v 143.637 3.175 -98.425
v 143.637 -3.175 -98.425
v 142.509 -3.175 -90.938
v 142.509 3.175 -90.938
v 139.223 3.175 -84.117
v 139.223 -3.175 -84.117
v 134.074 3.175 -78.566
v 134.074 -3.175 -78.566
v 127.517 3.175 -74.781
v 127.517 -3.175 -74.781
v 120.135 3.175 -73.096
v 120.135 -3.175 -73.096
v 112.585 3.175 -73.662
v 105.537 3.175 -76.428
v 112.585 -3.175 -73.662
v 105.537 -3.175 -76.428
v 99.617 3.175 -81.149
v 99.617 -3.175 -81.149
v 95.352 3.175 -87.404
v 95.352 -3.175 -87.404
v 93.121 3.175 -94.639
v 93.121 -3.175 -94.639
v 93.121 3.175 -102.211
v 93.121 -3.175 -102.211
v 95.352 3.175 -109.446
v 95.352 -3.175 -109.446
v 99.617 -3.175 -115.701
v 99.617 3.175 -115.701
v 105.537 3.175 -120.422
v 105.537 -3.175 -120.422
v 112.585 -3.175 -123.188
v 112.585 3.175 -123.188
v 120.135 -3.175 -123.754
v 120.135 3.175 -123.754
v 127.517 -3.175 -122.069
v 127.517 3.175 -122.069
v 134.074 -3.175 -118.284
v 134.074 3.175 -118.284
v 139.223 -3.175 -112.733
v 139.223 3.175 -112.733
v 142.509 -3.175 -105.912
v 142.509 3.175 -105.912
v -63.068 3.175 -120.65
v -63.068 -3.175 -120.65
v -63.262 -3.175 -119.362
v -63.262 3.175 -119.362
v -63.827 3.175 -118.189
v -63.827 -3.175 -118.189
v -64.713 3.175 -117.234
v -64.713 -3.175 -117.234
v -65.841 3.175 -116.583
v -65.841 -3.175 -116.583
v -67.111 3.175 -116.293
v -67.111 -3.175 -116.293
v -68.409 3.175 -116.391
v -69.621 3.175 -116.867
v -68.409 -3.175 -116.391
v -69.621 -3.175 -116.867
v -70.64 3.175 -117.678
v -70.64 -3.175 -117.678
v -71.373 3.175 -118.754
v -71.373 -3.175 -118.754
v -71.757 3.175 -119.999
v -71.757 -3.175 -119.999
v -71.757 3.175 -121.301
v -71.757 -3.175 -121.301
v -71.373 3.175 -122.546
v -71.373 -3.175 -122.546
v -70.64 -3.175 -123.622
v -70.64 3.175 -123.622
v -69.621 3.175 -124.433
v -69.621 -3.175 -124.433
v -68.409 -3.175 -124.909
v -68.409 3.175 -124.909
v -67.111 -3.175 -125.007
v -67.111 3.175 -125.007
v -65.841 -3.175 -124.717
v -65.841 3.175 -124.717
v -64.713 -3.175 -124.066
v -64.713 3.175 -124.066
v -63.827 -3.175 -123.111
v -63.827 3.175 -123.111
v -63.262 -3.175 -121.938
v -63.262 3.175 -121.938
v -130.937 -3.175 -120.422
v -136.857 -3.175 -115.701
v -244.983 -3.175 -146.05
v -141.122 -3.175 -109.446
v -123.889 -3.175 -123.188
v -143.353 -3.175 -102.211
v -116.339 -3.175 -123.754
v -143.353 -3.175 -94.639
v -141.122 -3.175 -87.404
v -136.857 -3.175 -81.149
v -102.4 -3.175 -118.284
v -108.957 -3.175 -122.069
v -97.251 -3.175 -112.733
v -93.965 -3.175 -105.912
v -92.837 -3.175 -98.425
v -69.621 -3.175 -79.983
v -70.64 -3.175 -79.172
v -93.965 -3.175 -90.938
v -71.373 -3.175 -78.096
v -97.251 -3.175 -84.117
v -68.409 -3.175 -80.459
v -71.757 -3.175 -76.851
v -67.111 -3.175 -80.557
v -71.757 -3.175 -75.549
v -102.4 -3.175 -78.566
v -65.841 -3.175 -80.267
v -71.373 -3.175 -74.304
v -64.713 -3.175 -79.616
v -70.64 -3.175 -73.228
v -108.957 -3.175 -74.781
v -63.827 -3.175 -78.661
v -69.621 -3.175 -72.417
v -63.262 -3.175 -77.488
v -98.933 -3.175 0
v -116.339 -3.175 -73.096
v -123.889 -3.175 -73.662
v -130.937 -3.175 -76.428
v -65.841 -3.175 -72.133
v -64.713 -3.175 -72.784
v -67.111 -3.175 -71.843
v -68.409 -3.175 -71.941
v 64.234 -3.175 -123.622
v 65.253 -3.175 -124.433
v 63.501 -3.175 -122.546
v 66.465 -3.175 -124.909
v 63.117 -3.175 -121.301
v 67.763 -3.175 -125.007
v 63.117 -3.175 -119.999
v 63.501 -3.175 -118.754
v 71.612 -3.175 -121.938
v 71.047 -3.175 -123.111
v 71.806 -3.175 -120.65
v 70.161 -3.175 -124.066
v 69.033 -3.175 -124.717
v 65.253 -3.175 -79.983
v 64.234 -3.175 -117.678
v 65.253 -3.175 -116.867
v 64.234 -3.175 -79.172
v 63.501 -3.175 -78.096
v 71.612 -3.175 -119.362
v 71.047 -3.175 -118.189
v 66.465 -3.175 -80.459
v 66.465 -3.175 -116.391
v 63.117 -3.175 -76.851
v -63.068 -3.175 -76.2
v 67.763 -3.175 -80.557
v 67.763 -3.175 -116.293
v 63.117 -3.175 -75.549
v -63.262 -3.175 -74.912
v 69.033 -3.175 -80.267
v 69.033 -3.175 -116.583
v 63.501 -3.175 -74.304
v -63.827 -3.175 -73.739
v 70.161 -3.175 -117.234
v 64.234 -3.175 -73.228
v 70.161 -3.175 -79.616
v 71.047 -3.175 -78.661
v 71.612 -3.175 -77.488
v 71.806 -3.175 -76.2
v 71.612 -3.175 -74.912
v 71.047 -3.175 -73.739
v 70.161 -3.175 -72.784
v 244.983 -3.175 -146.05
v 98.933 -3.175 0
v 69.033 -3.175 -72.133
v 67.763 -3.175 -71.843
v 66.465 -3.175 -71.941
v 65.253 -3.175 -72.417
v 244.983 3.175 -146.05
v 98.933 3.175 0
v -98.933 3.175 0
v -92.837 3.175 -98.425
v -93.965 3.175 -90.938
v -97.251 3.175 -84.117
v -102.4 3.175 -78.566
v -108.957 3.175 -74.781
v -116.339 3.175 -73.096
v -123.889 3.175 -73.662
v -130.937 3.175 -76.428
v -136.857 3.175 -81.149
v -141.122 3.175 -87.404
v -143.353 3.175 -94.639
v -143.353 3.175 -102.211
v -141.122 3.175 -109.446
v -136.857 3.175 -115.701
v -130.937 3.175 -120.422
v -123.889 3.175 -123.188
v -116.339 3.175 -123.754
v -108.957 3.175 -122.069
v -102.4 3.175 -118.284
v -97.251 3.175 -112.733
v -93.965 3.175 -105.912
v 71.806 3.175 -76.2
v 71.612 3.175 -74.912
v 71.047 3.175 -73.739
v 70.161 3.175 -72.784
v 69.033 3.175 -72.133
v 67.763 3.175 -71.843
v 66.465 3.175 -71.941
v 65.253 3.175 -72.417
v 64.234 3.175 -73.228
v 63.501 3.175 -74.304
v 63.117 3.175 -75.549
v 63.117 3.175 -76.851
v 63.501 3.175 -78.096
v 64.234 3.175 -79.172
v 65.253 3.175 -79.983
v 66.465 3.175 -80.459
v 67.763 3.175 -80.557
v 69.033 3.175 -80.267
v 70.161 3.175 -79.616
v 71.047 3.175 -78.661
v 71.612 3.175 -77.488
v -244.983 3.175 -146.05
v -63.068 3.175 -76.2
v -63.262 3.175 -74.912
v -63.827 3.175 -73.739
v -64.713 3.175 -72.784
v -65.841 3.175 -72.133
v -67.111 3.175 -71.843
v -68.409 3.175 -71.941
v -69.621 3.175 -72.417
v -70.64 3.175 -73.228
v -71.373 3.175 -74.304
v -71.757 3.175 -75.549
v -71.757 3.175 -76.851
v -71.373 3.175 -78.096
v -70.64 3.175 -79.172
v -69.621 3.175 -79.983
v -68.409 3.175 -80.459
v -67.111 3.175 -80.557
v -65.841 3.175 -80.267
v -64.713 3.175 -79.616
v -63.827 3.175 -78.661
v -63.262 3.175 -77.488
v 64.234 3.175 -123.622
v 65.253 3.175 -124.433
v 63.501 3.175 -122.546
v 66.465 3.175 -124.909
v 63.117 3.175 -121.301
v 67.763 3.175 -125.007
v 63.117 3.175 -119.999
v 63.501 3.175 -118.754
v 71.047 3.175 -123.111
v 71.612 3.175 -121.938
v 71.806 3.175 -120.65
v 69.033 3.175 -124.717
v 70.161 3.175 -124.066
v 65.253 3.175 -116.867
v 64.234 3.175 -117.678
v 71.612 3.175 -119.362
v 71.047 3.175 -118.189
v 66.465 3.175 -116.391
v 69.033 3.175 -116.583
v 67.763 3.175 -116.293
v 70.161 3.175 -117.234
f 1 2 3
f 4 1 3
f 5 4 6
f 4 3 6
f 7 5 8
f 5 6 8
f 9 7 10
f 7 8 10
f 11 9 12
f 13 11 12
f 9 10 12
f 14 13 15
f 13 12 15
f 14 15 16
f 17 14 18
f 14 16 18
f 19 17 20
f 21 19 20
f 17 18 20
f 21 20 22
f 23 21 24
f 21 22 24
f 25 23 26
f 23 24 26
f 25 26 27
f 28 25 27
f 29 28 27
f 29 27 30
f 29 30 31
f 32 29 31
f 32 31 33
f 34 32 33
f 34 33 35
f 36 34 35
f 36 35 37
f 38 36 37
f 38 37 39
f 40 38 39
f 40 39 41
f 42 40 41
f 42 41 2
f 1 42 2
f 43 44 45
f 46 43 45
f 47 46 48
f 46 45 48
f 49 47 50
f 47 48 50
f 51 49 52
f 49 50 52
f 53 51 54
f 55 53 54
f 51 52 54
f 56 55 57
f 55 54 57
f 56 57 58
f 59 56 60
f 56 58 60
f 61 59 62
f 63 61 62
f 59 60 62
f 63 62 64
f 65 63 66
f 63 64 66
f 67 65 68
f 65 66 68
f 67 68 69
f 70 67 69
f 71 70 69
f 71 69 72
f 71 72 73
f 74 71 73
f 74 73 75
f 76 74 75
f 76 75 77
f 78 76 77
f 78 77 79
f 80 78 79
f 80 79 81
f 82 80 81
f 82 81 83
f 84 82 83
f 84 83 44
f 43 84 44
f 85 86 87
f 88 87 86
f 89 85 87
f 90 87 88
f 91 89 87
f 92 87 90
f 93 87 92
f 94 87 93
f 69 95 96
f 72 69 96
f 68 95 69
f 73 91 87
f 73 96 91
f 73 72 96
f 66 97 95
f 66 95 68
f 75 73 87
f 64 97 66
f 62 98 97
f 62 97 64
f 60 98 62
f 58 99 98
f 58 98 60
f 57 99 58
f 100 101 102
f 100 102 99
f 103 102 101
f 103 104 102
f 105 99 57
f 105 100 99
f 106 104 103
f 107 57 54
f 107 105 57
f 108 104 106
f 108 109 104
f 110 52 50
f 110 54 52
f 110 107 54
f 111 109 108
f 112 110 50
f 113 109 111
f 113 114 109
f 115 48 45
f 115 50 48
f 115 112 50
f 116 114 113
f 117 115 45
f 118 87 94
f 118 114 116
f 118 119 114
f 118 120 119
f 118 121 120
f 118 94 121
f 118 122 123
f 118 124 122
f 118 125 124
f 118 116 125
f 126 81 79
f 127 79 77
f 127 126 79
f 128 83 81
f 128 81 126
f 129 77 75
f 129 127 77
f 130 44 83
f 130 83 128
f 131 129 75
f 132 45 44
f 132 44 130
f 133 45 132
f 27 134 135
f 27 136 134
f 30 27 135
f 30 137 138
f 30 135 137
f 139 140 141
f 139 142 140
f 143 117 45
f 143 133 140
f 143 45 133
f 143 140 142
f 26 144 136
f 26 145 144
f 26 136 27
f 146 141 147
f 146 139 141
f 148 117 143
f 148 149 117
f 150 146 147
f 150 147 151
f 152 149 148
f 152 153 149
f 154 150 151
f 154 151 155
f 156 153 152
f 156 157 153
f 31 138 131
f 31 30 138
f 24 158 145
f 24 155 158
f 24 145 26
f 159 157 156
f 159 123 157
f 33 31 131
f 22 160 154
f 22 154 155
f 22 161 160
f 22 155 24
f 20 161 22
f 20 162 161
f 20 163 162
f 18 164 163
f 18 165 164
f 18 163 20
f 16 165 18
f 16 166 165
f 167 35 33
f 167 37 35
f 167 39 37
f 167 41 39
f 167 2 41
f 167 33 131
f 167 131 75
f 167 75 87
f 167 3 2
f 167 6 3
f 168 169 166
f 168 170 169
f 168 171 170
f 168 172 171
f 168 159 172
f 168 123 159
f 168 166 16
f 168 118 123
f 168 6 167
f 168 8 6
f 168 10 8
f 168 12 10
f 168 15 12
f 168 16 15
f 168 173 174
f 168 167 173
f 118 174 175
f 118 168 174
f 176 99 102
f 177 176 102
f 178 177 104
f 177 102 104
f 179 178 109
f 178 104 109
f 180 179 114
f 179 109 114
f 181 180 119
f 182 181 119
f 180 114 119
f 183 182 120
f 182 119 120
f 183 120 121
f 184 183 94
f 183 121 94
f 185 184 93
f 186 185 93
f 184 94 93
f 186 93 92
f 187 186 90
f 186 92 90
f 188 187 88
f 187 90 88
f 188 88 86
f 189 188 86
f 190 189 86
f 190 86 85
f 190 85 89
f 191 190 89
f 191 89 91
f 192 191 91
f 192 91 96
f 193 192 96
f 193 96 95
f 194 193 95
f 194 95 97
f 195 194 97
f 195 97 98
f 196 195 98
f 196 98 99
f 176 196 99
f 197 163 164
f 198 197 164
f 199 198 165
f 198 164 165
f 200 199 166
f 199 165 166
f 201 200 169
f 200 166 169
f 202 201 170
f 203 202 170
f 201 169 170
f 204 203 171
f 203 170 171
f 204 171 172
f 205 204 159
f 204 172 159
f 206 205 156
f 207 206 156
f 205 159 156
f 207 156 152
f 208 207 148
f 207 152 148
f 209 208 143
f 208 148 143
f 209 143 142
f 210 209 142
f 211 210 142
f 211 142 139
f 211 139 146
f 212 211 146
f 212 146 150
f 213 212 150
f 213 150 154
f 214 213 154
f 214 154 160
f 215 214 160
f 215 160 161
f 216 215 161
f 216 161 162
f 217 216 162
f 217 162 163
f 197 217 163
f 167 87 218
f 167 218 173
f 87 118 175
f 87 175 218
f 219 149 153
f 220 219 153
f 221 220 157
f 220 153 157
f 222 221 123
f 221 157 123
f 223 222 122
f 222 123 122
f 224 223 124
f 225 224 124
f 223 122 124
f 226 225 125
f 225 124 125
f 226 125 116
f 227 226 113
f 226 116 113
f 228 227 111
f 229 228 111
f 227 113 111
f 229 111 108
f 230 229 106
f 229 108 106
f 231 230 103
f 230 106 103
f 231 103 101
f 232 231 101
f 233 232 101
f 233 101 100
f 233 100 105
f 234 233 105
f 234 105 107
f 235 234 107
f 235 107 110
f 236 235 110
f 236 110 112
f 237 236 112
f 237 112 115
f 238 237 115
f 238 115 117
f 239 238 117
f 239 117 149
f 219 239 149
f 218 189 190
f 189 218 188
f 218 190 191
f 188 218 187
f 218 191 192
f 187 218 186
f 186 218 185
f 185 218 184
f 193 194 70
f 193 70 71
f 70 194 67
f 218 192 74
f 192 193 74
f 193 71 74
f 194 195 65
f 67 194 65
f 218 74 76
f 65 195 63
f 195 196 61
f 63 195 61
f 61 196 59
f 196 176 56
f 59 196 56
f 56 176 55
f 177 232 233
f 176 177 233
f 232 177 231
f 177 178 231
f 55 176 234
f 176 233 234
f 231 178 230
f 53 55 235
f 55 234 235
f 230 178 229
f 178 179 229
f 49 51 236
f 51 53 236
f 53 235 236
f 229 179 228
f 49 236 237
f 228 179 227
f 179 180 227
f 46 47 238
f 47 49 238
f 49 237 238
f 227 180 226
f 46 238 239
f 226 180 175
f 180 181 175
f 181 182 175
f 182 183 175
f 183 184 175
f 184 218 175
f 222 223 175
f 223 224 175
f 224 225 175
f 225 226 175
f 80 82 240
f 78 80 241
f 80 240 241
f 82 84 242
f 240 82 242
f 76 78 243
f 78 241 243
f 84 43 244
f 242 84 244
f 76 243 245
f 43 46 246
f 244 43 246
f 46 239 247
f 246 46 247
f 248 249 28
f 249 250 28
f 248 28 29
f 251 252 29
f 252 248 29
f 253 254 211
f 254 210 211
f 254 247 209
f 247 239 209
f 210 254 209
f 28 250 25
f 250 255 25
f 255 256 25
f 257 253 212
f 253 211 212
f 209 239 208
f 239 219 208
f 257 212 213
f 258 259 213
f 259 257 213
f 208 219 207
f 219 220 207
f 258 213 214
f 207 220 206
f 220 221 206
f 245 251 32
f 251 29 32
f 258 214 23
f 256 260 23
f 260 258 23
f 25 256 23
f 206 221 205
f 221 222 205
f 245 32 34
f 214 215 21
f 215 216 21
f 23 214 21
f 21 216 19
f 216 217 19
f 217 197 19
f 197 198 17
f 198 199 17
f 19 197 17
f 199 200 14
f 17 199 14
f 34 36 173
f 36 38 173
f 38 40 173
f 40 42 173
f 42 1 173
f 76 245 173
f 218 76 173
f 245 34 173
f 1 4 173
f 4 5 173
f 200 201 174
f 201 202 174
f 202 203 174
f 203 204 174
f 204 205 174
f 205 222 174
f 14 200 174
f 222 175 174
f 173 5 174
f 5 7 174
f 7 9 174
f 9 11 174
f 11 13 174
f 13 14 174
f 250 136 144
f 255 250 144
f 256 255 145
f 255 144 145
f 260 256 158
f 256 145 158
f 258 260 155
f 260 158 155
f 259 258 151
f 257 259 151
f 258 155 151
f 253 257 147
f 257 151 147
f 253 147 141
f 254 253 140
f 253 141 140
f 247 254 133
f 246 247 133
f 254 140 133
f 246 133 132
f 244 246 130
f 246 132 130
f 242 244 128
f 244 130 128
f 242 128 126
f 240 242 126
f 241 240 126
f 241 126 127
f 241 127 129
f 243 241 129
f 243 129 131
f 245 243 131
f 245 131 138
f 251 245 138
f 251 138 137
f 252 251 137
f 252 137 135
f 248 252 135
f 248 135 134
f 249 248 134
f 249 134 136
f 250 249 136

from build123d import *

# Parameters (mm, degrees)
F1_DEPTH = 3.175
F2_R     = 4.3688
F2_R_2   = 25.4
F3_DEPTH = 6.351


with BuildPart() as f1:
    # F0 (on Front) → F1 (new body, symmetric)
    with BuildSketch(Plane.XZ):
        Polygon((98.933, 0), (-98.933, 0), (-244.983, -146.05), (244.983, -146.05), align=None)
    extrude(amount=F1_DEPTH, both=True)

    # F2 (on face) → F3 (cut, through all)
    with BuildSketch(Plane.XZ.offset(3.175)):
        with Locations((67.437, -76.2)):
            Circle(F2_R)
        with Locations((67.437, -120.65)):
            Circle(F2_R)
        with Locations((-67.437, -76.2)):
            Circle(F2_R)
        with Locations((-67.437, -120.65)):
            Circle(F2_R)
        with Locations((-118.237, -98.425)):
            Circle(F2_R_2)
        with Locations((118.237, -98.425)):
            Circle(F2_R_2)
    extrude(amount=-F3_DEPTH, mode=Mode.SUBTRACT)


solid = f1.part
